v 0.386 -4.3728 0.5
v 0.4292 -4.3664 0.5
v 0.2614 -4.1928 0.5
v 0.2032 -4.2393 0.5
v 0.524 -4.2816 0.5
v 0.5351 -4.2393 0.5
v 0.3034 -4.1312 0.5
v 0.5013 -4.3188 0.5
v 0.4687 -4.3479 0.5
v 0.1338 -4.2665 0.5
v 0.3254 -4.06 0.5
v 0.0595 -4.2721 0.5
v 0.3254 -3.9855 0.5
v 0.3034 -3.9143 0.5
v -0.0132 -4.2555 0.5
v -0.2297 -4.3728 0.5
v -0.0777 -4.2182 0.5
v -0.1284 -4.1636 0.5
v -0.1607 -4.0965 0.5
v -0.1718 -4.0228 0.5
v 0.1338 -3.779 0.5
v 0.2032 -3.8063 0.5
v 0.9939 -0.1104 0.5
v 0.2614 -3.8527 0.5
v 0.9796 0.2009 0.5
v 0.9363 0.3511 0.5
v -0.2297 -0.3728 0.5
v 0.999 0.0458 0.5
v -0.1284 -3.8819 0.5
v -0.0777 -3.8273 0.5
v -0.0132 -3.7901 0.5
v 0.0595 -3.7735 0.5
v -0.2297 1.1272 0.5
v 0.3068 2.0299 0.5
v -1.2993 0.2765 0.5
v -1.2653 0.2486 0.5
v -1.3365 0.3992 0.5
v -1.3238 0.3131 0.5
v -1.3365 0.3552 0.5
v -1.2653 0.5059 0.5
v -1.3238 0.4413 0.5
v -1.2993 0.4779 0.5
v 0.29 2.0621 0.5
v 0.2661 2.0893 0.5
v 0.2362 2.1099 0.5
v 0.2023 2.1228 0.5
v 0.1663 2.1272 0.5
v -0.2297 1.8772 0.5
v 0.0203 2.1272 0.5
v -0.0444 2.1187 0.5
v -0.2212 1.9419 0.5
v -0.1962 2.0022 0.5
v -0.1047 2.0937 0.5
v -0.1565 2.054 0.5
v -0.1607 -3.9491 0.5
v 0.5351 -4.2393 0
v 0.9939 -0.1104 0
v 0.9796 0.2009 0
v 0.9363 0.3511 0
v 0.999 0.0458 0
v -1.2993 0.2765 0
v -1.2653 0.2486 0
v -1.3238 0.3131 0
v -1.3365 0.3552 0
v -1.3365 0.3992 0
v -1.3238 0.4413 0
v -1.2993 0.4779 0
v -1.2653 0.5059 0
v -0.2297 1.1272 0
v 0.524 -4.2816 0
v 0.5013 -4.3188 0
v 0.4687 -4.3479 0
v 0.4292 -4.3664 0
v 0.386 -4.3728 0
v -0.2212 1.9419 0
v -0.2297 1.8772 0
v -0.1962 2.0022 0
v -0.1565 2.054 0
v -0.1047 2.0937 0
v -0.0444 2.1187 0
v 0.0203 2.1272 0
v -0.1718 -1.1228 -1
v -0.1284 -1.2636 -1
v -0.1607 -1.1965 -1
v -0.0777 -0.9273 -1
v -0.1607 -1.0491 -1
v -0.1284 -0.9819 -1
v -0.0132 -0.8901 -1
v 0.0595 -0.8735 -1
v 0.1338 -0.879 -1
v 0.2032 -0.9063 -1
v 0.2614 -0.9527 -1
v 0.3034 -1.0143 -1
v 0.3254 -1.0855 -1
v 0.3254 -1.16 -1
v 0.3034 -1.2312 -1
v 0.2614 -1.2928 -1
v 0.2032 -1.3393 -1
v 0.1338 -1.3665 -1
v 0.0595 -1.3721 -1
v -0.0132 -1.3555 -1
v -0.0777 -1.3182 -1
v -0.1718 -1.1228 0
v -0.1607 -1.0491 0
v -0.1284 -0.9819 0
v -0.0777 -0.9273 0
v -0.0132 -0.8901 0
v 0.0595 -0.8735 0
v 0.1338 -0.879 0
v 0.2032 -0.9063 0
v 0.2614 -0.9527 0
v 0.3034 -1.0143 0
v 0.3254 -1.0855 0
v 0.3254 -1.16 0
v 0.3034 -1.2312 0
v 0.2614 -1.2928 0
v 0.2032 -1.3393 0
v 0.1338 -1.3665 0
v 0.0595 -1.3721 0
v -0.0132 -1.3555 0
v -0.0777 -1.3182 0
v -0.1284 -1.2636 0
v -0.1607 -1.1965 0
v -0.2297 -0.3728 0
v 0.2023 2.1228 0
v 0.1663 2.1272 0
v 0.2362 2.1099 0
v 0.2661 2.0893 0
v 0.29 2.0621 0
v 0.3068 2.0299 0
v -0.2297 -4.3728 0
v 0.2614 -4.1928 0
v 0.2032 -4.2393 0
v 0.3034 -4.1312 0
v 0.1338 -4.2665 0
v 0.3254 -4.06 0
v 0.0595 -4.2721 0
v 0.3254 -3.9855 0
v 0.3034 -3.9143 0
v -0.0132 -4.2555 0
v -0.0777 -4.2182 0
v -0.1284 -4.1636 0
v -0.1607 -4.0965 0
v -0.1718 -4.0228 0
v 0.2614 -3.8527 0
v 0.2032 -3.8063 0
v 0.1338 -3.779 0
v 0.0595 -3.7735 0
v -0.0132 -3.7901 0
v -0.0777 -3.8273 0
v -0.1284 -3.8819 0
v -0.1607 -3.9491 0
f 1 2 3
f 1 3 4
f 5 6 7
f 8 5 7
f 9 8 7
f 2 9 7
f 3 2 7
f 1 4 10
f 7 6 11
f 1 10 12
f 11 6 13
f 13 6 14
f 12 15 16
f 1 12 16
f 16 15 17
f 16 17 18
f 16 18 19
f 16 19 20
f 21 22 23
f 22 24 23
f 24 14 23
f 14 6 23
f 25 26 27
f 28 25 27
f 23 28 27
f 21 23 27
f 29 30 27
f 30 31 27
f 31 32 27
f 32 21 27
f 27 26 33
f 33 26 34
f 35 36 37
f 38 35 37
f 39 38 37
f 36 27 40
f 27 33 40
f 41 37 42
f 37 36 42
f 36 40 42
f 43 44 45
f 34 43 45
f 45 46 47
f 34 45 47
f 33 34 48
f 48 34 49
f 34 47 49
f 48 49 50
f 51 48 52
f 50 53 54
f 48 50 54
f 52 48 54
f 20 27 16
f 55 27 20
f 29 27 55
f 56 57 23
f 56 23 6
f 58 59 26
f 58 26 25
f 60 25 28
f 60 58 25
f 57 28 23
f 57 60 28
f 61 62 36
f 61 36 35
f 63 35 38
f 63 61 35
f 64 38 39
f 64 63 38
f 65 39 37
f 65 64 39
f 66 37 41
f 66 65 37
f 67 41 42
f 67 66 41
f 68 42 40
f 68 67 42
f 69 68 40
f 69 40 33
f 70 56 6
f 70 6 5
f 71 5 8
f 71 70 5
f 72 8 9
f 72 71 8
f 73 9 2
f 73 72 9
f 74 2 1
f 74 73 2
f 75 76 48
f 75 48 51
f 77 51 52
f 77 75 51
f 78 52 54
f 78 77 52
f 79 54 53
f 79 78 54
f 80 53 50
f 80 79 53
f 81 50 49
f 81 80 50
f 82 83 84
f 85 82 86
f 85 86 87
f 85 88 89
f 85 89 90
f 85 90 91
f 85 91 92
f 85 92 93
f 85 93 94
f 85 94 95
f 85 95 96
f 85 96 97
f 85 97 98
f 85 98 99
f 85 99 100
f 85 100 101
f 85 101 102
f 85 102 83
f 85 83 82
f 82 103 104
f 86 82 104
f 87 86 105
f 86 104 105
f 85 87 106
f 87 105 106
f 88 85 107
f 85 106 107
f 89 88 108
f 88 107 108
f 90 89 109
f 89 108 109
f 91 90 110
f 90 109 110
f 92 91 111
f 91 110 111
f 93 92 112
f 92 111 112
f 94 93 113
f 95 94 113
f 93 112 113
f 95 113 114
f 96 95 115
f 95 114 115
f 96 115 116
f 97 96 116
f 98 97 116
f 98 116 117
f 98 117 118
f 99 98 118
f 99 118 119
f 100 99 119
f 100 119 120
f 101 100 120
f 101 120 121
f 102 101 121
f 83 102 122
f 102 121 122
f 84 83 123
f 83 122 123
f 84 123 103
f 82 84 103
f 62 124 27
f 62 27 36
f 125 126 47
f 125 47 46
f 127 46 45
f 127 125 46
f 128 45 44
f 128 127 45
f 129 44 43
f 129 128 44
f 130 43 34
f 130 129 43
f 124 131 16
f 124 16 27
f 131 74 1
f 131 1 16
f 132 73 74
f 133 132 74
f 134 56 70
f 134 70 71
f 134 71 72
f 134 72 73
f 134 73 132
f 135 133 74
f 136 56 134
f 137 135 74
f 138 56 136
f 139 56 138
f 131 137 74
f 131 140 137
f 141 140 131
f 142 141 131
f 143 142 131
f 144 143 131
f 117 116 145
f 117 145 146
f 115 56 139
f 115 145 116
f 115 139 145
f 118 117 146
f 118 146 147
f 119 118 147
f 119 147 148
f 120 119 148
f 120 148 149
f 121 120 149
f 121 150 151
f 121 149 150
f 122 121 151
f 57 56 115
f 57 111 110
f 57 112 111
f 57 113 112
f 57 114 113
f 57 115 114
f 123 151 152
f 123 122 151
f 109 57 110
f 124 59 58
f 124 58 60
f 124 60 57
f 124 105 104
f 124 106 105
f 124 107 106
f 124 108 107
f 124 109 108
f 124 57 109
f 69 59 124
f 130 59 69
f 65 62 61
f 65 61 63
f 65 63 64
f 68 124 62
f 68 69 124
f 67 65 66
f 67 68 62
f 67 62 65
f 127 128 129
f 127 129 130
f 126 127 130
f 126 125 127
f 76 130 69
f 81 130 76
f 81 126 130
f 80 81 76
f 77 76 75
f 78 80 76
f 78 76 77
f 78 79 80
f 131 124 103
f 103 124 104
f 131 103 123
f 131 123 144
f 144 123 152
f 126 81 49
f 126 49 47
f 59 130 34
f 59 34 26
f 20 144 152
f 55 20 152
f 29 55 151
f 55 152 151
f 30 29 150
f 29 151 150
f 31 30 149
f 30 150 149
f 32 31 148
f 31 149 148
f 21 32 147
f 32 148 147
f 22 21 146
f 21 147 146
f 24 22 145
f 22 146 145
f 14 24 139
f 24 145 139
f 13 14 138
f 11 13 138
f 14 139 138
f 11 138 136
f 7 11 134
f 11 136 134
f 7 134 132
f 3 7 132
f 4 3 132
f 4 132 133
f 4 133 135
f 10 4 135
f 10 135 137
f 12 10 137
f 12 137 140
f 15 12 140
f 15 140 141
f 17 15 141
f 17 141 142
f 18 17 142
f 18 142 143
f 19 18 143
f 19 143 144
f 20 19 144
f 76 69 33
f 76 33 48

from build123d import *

# Parameters (mm, degrees)
SALIENTE_EXTRUIR1_DEPTH = 0.5
CROQUIS3_R              = 0.25
SALIENTE_EXTRUIR3_DEPTH = 1
CORTAR_EXTRUIR1_REACH   = 2.5
CROQUIS2_R              = 0.25


with BuildPart() as part:
    # Croquis1 → Saliente-Extruir1 (new body)
    with BuildSketch(Plane.XY):
        with BuildLine():
            Line((0.306789568, 2.029895733), (0.936329178, 0.351123442))
            ThreePointArc((0.936329178, 0.351123442), (0.992314828, 0.123738762), (0.993883735, -0.110431526))
            Line((0.993883735, -0.110431526), (0.535116403, -4.239337512))
            ThreePointArc((0.535116403, -4.239337512), (0.486072062, -4.334541985), (0.386033843, -4.372772783))
            Line((0.386033843, -4.372772783), (-0.229709738, -4.372772783))
            Line((-0.229709738, -4.372772783), (-0.229709738, -0.372772783))
            Line((-0.229709738, -0.372772783), (-1.265336507, 0.248603278))
            ThreePointArc((-1.265336507, 0.248603278), (-1.338162144, 0.377227217), (-1.265336507, 0.505851156))
            Line((-1.265336507, 0.505851156), (-0.229709738, 1.127227217))
            Line((-0.229709738, 1.127227217), (-0.229709738, 1.877227217))
            ThreePointArc((-0.229709738, 1.877227217), (-0.156486434, 2.054003913), (0.020290262, 2.127227217))
            Line((0.020290262, 2.127227217), (0.166340191, 2.127227217))
            ThreePointArc((0.166340191, 2.127227217), (0.251779417, 2.10051606), (0.306789568, 2.029895733))
        make_face()
    extrude(amount=SALIENTE_EXTRUIR1_DEPTH)

    # Croquis3 → Saliente-Extruir3 (add)
    with BuildSketch(Plane(origin=(0, 0, 0), x_dir=(-1, 0, 0), z_dir=(0, 0, -1))):
        with Locations((-0.078162052, -1.122772783)):
            Circle(CROQUIS3_R)
    extrude(amount=SALIENTE_EXTRUIR3_DEPTH)

    # Croquis2 → Cortar-Extruir1 (cut, up to next)
    with BuildSketch(Plane(origin=(0, 0, 0), x_dir=(-1, 0, 0), z_dir=(0, 0, -1)), mode=Mode.PRIVATE) as cortar_extruir1_sk1:
        with Locations((-0.078162052, -4.022772783)):
            Circle(CROQUIS2_R)
    cortar_extruir1_tool1 = extrude(cortar_extruir1_sk1.sketch, amount=-CORTAR_EXTRUIR1_REACH, mode=Mode.PRIVATE) & part.part
    add(cortar_extruir1_tool1.solids().sort_by_distance((0.078162, -4.022773, 0))[0], mode=Mode.SUBTRACT)


solid = part.part
